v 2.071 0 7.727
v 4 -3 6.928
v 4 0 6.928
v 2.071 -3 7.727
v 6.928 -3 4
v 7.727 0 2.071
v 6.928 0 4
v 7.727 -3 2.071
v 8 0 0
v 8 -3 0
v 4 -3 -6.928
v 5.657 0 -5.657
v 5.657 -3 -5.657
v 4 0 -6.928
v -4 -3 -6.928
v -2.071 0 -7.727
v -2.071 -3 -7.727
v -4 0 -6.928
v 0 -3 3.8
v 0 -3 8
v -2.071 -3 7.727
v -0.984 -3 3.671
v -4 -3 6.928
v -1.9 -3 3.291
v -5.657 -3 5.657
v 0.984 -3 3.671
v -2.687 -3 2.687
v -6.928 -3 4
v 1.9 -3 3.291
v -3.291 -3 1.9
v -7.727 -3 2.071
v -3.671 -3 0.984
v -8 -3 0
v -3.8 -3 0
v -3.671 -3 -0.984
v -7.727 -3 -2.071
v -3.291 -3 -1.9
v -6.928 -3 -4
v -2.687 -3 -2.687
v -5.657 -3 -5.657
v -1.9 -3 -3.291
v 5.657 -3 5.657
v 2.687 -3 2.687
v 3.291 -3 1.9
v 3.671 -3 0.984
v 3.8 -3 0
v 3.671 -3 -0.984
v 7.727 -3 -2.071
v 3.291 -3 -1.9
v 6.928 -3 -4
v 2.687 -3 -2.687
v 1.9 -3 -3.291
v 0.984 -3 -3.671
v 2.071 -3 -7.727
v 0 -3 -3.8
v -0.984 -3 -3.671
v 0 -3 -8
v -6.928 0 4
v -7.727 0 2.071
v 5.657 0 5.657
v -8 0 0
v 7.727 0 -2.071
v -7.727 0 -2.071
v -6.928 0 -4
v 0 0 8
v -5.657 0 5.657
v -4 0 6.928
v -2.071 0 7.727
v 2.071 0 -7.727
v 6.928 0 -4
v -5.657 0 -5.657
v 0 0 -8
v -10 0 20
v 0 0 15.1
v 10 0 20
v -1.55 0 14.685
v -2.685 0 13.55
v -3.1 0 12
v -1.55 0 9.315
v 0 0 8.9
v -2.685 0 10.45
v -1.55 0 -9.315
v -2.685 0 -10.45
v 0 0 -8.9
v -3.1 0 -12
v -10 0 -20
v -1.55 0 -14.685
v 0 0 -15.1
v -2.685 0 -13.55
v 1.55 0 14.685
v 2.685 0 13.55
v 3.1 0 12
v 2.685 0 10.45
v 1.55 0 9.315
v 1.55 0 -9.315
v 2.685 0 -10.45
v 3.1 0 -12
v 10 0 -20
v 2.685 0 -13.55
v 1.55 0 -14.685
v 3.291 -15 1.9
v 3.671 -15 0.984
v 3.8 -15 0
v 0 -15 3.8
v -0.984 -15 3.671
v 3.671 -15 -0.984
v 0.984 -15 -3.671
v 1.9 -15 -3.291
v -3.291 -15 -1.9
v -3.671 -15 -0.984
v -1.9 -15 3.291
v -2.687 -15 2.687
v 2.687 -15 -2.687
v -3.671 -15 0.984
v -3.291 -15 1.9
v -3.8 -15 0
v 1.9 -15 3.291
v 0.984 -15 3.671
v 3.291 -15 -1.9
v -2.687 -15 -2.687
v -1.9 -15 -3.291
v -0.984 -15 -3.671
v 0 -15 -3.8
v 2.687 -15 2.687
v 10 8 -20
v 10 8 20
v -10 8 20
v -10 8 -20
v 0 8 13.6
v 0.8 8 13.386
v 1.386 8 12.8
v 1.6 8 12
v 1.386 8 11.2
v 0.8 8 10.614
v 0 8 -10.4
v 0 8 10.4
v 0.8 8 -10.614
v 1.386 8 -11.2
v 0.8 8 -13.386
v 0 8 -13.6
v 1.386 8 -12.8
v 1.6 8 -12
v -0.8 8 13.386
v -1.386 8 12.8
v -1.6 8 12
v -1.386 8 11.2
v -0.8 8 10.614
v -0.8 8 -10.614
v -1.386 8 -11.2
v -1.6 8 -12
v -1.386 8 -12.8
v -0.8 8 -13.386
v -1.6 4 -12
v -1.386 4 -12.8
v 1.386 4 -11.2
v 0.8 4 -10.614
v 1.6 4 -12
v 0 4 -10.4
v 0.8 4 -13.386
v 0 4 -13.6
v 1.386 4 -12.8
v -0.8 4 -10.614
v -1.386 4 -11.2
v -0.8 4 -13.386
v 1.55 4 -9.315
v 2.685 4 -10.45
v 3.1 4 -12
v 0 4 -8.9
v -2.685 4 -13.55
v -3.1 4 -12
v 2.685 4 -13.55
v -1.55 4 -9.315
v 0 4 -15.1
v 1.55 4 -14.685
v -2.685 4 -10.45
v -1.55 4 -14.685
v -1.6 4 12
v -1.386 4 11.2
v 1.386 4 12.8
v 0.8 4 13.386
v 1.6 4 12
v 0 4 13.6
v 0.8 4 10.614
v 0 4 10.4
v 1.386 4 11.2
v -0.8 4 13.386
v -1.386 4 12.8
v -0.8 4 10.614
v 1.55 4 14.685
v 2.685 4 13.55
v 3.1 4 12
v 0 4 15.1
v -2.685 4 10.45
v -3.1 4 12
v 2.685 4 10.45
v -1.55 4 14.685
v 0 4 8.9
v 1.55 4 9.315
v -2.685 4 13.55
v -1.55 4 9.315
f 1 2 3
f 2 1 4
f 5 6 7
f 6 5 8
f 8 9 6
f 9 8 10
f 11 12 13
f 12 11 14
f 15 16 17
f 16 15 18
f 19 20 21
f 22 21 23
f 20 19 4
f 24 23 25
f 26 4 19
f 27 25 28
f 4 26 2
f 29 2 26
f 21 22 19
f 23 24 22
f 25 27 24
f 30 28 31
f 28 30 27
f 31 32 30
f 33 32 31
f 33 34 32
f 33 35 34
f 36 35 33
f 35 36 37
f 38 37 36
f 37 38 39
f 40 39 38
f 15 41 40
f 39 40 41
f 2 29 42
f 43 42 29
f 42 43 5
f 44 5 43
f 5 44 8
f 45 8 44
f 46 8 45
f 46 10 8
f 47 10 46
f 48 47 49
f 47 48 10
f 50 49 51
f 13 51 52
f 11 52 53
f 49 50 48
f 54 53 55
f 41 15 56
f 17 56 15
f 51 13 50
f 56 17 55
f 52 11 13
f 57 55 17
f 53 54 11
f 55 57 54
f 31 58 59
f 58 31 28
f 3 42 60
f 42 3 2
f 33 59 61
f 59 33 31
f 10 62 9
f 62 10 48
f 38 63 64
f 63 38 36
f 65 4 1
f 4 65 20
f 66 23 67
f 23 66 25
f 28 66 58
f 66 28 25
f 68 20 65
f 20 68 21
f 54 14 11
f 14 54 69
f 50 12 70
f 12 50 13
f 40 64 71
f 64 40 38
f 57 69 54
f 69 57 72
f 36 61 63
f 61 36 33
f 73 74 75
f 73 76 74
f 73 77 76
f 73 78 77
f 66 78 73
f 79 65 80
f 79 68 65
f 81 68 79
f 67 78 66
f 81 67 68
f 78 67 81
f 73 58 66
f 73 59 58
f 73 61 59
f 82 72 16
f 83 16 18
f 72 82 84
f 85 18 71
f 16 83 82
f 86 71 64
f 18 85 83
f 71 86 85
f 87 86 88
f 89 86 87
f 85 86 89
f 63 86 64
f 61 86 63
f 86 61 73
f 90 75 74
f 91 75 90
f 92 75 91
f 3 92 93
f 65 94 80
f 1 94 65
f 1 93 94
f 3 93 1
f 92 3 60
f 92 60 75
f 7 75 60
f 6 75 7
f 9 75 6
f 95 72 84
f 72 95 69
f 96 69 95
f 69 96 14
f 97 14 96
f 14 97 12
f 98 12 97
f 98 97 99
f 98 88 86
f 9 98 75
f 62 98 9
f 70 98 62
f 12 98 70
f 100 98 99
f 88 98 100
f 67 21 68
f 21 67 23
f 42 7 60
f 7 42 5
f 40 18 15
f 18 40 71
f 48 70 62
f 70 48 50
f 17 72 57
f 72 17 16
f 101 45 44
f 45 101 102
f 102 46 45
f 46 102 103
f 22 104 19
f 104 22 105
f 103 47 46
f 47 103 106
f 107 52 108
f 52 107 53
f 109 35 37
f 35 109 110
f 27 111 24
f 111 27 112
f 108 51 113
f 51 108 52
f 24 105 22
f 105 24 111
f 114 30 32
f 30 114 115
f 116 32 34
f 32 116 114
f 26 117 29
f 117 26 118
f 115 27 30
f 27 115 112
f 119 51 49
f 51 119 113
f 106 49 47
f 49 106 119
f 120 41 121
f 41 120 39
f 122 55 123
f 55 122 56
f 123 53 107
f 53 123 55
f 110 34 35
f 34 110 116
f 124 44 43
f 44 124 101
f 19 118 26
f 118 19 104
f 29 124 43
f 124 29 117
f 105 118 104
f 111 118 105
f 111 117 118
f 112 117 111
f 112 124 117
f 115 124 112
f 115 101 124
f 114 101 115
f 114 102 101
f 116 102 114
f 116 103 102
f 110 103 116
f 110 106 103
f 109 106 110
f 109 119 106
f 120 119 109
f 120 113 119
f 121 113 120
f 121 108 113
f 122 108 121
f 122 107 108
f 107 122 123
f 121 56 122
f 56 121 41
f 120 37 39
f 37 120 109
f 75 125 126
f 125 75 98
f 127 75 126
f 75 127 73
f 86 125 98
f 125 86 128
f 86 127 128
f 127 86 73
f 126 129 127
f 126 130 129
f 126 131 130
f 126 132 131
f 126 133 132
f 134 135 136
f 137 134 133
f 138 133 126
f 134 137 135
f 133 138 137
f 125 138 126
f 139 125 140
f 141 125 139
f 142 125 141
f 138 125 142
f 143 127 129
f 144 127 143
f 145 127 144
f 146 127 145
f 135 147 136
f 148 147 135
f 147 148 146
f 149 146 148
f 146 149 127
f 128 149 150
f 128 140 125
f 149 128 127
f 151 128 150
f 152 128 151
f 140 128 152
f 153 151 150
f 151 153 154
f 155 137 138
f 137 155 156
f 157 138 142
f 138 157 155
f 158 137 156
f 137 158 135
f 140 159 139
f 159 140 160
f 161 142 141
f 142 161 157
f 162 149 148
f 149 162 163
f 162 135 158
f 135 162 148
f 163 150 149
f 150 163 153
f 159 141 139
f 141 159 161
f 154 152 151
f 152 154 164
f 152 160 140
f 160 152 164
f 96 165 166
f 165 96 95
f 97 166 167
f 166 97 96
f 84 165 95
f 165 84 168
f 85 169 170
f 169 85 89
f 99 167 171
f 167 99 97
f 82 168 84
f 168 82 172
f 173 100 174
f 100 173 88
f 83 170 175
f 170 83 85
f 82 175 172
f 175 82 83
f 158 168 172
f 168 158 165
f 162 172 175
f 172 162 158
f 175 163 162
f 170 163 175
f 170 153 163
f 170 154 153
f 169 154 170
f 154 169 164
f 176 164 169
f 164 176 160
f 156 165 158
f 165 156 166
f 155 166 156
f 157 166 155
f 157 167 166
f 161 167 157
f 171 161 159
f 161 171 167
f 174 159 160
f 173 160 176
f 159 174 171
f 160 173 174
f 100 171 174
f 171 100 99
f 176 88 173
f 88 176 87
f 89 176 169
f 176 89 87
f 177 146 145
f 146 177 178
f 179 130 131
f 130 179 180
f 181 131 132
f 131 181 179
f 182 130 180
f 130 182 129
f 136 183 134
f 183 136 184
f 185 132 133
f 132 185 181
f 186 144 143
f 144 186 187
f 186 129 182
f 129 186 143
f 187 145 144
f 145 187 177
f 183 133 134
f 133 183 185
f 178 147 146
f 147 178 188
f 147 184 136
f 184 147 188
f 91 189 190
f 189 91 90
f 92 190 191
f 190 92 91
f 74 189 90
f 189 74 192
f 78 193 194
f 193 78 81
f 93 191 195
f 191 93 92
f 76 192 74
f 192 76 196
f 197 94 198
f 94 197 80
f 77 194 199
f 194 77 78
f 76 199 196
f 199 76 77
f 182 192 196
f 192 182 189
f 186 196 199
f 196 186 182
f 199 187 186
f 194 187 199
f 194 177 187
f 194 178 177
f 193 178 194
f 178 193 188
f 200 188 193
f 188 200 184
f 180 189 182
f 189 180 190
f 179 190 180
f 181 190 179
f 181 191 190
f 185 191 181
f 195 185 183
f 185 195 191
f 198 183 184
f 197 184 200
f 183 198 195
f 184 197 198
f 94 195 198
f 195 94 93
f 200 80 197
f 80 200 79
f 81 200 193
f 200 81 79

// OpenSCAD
difference()
{
	union()
	{
		translate([-10,0,-20])cube([20,8,40]);
		rotate([90,0,0])
		{
			cylinder(r=8,h=3,$fn=24);
			cylinder(r=3.8,h=15,$fn=24);
		}
	}
	for(z=[-12,12])
	translate([0,10,z])
	rotate([90,0,0])
	{
		cylinder(r=3.2/2,h=20,$fn=12);
		translate([0,0,6])
		#cylinder(r=6.2/2,h=5,$fn=12);
	}
}
